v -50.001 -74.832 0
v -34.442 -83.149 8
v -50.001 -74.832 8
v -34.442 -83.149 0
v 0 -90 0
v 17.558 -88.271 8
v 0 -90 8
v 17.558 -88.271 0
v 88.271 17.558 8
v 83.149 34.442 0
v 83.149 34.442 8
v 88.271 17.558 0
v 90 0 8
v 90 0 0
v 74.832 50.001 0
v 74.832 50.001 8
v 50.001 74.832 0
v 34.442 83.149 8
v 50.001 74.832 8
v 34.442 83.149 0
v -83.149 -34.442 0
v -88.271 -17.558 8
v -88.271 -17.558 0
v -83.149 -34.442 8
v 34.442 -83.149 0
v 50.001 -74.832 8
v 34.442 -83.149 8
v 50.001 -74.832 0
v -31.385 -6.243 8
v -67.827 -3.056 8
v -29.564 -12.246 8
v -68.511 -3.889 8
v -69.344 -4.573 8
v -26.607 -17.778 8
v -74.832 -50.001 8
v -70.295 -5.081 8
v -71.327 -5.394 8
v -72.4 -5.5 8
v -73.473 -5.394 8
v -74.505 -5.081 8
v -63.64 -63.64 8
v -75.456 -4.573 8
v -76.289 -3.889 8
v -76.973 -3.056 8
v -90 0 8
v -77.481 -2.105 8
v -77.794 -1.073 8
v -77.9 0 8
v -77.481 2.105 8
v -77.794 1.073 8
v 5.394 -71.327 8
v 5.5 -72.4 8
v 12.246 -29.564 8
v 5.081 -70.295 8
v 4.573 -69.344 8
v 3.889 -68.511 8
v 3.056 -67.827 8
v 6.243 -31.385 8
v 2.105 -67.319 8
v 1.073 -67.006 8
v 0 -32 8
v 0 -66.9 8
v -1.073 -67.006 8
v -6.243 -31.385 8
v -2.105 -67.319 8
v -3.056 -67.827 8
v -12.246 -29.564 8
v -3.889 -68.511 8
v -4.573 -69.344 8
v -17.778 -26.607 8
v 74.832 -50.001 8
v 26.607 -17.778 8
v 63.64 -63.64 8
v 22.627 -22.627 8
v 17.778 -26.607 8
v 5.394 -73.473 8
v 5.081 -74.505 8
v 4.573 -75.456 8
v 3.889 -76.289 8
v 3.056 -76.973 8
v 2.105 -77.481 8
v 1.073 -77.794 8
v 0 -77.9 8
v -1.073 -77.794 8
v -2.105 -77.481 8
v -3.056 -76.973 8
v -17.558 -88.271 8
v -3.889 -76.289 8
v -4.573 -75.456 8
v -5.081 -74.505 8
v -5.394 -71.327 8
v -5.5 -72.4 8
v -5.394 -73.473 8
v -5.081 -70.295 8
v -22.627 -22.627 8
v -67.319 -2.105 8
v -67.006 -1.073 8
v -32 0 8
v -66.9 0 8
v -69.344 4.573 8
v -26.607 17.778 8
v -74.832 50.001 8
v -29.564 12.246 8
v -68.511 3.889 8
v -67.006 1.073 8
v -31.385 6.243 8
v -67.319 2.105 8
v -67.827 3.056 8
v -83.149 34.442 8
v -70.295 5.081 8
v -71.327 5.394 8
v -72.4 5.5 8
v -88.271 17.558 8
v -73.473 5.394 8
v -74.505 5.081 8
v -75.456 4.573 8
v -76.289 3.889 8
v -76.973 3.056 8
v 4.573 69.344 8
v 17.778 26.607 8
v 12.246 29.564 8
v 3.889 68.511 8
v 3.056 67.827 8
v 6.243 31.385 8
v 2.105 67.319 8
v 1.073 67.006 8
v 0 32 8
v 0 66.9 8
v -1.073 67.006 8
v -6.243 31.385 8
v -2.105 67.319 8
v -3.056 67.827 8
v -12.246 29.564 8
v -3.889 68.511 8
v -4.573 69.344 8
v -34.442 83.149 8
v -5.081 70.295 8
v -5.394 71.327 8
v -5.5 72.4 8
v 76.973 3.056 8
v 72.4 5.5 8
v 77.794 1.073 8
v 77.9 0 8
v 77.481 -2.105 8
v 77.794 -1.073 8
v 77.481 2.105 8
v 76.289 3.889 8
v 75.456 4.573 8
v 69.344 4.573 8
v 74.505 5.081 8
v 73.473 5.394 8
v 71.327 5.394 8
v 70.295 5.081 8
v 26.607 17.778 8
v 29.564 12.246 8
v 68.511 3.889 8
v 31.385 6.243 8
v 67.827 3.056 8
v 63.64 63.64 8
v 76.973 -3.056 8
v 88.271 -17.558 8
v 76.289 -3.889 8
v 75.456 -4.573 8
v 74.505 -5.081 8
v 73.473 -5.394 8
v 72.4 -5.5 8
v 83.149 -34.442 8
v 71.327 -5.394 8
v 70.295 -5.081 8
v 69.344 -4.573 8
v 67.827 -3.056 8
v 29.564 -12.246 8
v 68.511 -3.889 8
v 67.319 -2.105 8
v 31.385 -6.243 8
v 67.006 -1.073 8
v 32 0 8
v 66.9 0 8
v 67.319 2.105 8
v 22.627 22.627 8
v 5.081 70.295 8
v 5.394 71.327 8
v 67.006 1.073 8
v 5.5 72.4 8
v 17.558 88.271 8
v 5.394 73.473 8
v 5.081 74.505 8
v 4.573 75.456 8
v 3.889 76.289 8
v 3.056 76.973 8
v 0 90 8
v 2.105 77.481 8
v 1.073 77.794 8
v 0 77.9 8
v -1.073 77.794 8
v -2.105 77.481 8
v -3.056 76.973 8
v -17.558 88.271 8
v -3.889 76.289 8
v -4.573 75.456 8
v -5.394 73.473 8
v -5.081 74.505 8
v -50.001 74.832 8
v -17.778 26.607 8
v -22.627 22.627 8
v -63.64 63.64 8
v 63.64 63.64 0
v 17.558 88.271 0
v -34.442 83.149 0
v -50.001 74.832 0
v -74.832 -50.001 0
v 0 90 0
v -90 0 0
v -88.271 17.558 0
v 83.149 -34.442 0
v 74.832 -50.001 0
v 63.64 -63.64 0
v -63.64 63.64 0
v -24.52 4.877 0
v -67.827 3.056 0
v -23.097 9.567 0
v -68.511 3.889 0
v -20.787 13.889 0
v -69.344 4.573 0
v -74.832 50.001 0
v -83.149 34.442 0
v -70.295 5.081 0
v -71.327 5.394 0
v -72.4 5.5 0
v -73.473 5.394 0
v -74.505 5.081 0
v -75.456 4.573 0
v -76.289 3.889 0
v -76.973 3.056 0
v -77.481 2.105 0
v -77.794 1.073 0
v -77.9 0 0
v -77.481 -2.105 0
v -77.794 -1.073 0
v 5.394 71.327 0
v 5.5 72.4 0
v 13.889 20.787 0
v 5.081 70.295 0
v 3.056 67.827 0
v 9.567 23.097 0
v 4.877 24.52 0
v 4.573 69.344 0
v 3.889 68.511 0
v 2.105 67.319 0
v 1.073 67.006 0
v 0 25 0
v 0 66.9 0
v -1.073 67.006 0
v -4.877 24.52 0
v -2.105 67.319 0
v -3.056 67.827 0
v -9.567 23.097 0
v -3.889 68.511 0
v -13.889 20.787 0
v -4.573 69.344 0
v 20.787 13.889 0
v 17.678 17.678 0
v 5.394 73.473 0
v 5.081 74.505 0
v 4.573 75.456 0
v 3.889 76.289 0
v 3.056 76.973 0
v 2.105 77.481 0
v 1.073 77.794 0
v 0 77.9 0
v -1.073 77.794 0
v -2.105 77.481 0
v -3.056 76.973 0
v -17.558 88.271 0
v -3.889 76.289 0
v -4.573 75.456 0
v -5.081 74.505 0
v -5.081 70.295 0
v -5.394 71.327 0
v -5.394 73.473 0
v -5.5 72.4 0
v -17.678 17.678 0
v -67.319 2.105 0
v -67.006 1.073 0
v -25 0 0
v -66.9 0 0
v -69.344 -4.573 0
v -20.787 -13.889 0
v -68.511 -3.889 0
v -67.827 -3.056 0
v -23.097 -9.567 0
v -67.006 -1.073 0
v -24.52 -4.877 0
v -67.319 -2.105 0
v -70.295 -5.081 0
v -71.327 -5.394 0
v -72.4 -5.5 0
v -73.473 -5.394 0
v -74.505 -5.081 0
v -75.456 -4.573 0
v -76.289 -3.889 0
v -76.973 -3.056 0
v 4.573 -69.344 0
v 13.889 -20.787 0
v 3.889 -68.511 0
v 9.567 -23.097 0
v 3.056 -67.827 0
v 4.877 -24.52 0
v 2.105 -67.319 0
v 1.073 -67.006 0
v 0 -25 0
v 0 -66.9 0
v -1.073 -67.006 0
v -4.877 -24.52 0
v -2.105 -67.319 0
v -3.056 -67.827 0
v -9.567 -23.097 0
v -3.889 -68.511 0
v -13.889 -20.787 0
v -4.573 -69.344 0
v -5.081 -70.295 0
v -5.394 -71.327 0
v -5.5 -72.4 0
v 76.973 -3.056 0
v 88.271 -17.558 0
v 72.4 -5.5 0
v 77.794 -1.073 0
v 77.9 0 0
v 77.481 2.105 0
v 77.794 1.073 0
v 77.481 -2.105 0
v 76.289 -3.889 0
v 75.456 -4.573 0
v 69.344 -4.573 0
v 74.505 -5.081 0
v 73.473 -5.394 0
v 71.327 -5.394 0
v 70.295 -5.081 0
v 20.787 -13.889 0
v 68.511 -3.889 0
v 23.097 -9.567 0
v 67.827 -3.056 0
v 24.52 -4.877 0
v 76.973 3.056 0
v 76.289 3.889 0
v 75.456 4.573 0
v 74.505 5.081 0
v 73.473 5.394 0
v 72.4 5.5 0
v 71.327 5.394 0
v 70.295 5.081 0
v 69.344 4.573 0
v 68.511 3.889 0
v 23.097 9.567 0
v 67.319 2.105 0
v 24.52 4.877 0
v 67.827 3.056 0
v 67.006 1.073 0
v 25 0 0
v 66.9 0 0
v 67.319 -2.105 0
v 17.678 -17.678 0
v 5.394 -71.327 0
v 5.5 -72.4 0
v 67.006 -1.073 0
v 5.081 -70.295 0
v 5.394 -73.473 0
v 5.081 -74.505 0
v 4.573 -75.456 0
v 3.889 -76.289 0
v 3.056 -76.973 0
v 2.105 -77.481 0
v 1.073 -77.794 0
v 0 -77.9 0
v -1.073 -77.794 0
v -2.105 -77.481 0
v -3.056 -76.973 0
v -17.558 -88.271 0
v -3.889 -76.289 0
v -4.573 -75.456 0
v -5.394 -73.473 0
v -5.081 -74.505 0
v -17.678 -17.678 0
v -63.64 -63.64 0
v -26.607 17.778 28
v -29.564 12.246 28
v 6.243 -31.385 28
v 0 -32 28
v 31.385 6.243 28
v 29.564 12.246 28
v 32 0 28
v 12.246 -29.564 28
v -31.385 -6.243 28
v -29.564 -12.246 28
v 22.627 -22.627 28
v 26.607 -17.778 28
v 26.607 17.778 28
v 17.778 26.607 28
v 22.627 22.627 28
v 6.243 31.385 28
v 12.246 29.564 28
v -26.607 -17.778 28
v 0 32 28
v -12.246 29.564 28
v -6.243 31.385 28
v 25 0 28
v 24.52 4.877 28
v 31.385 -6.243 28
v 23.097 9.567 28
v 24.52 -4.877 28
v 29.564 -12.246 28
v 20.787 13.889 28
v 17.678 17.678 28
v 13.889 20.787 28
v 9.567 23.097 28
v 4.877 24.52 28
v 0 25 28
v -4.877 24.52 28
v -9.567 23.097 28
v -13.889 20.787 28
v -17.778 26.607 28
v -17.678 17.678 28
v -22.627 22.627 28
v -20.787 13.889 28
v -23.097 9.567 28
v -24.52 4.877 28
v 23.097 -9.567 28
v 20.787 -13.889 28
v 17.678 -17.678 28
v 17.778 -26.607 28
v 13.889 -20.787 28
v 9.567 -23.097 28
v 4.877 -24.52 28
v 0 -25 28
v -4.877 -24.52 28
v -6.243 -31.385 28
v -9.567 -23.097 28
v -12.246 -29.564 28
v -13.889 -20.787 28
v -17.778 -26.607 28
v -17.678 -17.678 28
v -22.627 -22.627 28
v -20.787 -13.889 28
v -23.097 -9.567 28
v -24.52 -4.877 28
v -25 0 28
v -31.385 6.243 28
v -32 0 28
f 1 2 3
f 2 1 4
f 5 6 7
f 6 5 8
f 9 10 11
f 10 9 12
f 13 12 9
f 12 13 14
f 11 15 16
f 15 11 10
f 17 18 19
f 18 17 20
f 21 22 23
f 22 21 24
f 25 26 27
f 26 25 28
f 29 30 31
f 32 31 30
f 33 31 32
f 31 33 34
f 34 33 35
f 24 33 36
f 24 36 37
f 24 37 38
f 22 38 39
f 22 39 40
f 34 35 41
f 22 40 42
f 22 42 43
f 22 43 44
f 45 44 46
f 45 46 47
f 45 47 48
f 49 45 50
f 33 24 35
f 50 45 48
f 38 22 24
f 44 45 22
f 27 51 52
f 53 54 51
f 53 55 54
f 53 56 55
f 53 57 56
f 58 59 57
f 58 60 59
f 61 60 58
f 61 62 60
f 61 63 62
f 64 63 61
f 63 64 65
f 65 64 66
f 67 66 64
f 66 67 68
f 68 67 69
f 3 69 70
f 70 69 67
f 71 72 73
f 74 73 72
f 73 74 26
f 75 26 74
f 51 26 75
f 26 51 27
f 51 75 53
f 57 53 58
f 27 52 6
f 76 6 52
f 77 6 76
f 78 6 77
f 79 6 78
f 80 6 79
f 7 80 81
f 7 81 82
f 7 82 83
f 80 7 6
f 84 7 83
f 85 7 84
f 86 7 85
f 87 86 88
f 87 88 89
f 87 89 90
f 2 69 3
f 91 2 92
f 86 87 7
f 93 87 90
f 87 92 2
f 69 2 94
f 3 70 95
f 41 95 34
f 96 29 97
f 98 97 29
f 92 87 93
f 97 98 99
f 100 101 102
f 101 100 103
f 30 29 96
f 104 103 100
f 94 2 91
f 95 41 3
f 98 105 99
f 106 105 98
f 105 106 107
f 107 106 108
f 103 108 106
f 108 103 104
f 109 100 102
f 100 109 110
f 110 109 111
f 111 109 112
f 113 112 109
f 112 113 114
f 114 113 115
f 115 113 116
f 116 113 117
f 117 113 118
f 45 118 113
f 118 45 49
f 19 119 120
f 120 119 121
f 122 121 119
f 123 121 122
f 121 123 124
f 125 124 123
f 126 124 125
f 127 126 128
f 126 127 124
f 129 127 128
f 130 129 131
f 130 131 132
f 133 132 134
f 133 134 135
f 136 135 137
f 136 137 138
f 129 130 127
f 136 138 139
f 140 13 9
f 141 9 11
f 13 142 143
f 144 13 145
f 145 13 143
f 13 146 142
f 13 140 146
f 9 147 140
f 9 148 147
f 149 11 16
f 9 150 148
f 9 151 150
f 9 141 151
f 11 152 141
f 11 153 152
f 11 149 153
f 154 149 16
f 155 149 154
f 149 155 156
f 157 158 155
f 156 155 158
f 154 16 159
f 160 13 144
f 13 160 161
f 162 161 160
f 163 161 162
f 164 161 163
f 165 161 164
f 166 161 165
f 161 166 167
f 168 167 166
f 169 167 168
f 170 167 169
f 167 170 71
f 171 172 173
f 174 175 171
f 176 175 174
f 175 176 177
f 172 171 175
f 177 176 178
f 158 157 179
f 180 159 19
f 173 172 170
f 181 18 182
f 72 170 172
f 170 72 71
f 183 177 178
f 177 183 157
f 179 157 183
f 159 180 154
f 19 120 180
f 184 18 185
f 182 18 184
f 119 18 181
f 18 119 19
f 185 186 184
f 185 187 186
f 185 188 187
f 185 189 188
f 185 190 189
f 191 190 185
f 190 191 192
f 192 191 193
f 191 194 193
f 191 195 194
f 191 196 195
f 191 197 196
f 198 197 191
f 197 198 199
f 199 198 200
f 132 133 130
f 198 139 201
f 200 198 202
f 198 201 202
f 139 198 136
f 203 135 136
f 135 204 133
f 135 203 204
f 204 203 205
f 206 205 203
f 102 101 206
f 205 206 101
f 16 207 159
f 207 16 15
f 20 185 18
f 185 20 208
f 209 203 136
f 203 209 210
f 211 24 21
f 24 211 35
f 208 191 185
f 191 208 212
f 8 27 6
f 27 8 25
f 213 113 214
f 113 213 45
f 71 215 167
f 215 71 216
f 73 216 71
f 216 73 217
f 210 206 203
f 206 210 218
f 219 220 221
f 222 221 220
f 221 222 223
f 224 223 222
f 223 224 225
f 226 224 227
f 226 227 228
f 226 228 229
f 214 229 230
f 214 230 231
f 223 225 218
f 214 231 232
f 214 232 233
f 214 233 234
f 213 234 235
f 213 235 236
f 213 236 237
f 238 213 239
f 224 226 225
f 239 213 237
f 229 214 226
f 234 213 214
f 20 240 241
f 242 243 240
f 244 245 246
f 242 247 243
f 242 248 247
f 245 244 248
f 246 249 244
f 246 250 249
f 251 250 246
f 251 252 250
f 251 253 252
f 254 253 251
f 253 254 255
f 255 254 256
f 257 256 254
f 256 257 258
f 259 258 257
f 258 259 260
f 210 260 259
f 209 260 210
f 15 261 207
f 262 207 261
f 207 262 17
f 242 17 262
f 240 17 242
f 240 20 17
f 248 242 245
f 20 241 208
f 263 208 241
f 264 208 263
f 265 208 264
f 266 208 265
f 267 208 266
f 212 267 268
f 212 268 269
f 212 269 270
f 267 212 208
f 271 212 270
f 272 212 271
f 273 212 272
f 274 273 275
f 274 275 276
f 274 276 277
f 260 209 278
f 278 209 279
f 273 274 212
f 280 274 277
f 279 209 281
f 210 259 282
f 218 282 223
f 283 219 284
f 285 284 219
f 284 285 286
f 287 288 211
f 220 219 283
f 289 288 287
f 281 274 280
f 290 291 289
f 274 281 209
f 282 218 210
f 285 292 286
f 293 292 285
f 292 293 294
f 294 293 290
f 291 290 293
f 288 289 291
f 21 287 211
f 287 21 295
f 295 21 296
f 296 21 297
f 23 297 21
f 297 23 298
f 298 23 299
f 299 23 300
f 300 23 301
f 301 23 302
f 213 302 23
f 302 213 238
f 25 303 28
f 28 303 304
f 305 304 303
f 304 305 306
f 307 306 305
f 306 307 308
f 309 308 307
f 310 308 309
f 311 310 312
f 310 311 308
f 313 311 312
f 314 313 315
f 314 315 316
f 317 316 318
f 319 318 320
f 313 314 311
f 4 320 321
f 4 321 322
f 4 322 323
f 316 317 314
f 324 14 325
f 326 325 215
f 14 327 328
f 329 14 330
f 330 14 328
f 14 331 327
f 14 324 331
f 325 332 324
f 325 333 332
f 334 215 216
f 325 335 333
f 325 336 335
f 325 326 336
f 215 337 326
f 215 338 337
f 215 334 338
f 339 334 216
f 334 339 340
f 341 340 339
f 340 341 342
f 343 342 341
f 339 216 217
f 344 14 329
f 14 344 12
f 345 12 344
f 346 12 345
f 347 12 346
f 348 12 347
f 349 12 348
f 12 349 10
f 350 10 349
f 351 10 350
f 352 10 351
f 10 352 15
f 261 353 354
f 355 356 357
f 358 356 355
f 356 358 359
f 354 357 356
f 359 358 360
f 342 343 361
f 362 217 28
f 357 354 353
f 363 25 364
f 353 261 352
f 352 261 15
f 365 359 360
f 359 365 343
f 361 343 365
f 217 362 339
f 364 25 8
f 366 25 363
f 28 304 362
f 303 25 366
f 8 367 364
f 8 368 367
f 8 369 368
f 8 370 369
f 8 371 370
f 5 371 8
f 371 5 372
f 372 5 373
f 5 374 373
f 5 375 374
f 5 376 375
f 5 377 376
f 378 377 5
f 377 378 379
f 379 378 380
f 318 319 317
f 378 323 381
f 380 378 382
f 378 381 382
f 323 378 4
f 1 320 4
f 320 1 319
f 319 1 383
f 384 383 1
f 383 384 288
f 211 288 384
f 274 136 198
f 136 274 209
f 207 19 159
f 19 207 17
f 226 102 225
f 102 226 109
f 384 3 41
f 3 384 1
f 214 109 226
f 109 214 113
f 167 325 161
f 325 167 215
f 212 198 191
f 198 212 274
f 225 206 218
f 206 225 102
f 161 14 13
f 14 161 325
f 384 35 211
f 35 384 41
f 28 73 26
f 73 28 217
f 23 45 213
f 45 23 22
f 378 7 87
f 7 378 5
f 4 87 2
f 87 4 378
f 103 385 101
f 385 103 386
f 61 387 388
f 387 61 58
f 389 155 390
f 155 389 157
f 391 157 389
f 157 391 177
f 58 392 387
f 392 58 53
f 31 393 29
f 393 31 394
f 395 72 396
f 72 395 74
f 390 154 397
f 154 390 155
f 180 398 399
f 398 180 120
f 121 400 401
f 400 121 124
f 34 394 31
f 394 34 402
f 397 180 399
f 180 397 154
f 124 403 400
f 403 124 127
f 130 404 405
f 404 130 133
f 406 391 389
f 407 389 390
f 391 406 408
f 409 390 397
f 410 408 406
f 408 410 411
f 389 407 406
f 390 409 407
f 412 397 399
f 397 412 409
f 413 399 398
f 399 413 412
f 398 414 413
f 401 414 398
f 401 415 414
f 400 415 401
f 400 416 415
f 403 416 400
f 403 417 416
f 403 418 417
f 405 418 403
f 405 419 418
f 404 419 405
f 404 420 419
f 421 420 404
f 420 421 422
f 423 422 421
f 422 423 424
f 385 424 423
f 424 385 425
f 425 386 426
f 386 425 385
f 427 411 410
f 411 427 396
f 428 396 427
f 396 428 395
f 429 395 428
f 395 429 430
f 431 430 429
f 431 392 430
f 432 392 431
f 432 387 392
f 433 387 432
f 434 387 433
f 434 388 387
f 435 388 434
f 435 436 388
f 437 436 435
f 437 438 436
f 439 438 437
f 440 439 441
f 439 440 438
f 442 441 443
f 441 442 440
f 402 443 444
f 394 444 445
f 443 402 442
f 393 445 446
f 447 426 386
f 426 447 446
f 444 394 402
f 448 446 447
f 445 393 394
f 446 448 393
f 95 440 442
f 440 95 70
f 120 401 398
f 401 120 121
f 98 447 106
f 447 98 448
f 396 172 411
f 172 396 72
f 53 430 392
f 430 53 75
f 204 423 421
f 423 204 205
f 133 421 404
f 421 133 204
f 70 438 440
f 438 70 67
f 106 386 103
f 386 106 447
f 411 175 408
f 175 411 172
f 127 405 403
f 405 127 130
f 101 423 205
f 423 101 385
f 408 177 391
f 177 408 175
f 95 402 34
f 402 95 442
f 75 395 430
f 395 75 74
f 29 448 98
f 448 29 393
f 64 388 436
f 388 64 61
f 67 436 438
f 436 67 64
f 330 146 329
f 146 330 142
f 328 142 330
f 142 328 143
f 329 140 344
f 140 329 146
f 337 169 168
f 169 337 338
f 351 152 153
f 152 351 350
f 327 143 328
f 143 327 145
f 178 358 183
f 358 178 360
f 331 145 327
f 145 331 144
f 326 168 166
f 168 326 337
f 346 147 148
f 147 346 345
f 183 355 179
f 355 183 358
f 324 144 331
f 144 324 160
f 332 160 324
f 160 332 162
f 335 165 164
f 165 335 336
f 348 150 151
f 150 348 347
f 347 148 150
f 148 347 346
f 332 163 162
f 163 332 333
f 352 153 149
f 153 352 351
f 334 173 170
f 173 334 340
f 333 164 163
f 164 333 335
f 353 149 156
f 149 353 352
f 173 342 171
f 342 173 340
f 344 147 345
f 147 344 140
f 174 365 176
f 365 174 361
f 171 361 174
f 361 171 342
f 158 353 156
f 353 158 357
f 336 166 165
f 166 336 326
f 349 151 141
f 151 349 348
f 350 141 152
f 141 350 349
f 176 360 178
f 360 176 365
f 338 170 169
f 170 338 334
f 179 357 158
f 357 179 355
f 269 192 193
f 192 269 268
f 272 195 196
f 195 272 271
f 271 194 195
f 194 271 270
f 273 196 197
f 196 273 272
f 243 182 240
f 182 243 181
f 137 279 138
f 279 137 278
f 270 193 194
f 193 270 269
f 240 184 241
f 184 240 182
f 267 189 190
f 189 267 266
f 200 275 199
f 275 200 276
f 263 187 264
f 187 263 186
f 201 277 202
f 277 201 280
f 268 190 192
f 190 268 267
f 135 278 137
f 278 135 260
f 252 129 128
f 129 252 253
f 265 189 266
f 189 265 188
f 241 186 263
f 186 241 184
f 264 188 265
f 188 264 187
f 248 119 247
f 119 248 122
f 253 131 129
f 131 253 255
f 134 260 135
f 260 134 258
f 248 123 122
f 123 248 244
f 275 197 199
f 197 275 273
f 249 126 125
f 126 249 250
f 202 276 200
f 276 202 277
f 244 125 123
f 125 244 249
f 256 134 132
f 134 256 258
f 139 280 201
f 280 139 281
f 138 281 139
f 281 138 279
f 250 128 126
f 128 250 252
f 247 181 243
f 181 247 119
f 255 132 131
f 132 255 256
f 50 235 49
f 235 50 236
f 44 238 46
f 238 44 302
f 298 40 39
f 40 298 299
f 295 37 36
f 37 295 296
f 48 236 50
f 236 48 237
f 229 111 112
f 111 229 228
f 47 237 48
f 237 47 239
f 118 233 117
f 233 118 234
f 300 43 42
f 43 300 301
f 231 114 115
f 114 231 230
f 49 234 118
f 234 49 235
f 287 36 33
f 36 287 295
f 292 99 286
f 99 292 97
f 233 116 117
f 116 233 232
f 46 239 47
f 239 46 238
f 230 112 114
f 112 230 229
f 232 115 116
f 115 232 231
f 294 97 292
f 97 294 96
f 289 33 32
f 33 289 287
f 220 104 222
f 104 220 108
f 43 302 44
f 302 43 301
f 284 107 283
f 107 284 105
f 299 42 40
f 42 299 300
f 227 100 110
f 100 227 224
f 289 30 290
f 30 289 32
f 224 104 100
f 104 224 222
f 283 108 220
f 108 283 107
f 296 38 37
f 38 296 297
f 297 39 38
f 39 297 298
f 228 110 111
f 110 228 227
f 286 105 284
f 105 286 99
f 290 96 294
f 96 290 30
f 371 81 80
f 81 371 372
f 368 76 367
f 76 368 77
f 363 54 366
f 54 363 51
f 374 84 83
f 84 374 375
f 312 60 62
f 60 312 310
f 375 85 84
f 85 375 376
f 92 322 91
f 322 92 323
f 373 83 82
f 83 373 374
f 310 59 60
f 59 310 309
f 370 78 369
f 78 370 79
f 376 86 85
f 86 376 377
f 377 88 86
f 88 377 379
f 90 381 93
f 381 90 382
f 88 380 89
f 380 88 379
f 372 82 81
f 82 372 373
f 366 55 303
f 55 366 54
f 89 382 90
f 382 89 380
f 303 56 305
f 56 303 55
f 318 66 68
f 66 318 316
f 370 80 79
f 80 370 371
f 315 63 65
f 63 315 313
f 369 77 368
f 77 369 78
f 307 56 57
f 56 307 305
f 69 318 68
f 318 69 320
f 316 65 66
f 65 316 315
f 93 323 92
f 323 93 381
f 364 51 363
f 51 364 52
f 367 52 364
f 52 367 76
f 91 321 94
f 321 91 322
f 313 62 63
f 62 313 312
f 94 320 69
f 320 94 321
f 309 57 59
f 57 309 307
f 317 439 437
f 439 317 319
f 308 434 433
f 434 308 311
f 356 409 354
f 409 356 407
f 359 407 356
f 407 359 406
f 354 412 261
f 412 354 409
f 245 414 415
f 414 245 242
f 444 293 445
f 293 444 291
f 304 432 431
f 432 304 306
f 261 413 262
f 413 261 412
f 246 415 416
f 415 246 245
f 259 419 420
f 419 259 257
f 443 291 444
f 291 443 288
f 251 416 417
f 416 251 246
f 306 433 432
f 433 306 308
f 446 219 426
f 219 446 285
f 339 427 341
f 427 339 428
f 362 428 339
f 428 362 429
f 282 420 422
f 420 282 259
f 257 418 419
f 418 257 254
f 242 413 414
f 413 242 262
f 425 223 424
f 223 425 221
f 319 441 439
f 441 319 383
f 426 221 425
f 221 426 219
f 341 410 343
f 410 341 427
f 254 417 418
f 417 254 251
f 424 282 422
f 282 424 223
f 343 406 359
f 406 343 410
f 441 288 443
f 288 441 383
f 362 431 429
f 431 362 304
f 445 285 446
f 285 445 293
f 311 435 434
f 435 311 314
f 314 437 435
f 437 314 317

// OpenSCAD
$fn = 32;

// ----------------------------------------------------------------------
// Bolt-circle flange: 180 mm outside, 4 bolt holes, bore 50 mm
// ----------------------------------------------------------------------

// --- parameters (mm) ---
flange_d = 180;           // flange outside diameter
flange_t = 8;             // flange thickness
bolts = 4;                // number of bolt holes
bolt_d = 11;              // bolt clearance
bolt_r = 72.4;            // bolt circle radius
bore_d = 50;              // centre bore
hub_d = 64;               // raised hub diameter
hub_h = 20;               // raised hub height

module body() {
  cylinder(h = flange_t, d = flange_d);
  /* raised hub, sunk 1 mm into the flange */
  translate([0, 0, flange_t - 1]) cylinder(h = hub_h + 1, d = hub_d);
}

difference() {
  body();
  /* bolt circle */
  for (i = [0 : bolts - 1]) rotate([0, 0, i * 360 / bolts]) translate([bolt_r, 0, -1]) cylinder(h = flange_t + hub_h + 3, d = bolt_d);
  translate([0, 0, -1]) cylinder(h = flange_t + hub_h + 3, d = bore_d);
}
